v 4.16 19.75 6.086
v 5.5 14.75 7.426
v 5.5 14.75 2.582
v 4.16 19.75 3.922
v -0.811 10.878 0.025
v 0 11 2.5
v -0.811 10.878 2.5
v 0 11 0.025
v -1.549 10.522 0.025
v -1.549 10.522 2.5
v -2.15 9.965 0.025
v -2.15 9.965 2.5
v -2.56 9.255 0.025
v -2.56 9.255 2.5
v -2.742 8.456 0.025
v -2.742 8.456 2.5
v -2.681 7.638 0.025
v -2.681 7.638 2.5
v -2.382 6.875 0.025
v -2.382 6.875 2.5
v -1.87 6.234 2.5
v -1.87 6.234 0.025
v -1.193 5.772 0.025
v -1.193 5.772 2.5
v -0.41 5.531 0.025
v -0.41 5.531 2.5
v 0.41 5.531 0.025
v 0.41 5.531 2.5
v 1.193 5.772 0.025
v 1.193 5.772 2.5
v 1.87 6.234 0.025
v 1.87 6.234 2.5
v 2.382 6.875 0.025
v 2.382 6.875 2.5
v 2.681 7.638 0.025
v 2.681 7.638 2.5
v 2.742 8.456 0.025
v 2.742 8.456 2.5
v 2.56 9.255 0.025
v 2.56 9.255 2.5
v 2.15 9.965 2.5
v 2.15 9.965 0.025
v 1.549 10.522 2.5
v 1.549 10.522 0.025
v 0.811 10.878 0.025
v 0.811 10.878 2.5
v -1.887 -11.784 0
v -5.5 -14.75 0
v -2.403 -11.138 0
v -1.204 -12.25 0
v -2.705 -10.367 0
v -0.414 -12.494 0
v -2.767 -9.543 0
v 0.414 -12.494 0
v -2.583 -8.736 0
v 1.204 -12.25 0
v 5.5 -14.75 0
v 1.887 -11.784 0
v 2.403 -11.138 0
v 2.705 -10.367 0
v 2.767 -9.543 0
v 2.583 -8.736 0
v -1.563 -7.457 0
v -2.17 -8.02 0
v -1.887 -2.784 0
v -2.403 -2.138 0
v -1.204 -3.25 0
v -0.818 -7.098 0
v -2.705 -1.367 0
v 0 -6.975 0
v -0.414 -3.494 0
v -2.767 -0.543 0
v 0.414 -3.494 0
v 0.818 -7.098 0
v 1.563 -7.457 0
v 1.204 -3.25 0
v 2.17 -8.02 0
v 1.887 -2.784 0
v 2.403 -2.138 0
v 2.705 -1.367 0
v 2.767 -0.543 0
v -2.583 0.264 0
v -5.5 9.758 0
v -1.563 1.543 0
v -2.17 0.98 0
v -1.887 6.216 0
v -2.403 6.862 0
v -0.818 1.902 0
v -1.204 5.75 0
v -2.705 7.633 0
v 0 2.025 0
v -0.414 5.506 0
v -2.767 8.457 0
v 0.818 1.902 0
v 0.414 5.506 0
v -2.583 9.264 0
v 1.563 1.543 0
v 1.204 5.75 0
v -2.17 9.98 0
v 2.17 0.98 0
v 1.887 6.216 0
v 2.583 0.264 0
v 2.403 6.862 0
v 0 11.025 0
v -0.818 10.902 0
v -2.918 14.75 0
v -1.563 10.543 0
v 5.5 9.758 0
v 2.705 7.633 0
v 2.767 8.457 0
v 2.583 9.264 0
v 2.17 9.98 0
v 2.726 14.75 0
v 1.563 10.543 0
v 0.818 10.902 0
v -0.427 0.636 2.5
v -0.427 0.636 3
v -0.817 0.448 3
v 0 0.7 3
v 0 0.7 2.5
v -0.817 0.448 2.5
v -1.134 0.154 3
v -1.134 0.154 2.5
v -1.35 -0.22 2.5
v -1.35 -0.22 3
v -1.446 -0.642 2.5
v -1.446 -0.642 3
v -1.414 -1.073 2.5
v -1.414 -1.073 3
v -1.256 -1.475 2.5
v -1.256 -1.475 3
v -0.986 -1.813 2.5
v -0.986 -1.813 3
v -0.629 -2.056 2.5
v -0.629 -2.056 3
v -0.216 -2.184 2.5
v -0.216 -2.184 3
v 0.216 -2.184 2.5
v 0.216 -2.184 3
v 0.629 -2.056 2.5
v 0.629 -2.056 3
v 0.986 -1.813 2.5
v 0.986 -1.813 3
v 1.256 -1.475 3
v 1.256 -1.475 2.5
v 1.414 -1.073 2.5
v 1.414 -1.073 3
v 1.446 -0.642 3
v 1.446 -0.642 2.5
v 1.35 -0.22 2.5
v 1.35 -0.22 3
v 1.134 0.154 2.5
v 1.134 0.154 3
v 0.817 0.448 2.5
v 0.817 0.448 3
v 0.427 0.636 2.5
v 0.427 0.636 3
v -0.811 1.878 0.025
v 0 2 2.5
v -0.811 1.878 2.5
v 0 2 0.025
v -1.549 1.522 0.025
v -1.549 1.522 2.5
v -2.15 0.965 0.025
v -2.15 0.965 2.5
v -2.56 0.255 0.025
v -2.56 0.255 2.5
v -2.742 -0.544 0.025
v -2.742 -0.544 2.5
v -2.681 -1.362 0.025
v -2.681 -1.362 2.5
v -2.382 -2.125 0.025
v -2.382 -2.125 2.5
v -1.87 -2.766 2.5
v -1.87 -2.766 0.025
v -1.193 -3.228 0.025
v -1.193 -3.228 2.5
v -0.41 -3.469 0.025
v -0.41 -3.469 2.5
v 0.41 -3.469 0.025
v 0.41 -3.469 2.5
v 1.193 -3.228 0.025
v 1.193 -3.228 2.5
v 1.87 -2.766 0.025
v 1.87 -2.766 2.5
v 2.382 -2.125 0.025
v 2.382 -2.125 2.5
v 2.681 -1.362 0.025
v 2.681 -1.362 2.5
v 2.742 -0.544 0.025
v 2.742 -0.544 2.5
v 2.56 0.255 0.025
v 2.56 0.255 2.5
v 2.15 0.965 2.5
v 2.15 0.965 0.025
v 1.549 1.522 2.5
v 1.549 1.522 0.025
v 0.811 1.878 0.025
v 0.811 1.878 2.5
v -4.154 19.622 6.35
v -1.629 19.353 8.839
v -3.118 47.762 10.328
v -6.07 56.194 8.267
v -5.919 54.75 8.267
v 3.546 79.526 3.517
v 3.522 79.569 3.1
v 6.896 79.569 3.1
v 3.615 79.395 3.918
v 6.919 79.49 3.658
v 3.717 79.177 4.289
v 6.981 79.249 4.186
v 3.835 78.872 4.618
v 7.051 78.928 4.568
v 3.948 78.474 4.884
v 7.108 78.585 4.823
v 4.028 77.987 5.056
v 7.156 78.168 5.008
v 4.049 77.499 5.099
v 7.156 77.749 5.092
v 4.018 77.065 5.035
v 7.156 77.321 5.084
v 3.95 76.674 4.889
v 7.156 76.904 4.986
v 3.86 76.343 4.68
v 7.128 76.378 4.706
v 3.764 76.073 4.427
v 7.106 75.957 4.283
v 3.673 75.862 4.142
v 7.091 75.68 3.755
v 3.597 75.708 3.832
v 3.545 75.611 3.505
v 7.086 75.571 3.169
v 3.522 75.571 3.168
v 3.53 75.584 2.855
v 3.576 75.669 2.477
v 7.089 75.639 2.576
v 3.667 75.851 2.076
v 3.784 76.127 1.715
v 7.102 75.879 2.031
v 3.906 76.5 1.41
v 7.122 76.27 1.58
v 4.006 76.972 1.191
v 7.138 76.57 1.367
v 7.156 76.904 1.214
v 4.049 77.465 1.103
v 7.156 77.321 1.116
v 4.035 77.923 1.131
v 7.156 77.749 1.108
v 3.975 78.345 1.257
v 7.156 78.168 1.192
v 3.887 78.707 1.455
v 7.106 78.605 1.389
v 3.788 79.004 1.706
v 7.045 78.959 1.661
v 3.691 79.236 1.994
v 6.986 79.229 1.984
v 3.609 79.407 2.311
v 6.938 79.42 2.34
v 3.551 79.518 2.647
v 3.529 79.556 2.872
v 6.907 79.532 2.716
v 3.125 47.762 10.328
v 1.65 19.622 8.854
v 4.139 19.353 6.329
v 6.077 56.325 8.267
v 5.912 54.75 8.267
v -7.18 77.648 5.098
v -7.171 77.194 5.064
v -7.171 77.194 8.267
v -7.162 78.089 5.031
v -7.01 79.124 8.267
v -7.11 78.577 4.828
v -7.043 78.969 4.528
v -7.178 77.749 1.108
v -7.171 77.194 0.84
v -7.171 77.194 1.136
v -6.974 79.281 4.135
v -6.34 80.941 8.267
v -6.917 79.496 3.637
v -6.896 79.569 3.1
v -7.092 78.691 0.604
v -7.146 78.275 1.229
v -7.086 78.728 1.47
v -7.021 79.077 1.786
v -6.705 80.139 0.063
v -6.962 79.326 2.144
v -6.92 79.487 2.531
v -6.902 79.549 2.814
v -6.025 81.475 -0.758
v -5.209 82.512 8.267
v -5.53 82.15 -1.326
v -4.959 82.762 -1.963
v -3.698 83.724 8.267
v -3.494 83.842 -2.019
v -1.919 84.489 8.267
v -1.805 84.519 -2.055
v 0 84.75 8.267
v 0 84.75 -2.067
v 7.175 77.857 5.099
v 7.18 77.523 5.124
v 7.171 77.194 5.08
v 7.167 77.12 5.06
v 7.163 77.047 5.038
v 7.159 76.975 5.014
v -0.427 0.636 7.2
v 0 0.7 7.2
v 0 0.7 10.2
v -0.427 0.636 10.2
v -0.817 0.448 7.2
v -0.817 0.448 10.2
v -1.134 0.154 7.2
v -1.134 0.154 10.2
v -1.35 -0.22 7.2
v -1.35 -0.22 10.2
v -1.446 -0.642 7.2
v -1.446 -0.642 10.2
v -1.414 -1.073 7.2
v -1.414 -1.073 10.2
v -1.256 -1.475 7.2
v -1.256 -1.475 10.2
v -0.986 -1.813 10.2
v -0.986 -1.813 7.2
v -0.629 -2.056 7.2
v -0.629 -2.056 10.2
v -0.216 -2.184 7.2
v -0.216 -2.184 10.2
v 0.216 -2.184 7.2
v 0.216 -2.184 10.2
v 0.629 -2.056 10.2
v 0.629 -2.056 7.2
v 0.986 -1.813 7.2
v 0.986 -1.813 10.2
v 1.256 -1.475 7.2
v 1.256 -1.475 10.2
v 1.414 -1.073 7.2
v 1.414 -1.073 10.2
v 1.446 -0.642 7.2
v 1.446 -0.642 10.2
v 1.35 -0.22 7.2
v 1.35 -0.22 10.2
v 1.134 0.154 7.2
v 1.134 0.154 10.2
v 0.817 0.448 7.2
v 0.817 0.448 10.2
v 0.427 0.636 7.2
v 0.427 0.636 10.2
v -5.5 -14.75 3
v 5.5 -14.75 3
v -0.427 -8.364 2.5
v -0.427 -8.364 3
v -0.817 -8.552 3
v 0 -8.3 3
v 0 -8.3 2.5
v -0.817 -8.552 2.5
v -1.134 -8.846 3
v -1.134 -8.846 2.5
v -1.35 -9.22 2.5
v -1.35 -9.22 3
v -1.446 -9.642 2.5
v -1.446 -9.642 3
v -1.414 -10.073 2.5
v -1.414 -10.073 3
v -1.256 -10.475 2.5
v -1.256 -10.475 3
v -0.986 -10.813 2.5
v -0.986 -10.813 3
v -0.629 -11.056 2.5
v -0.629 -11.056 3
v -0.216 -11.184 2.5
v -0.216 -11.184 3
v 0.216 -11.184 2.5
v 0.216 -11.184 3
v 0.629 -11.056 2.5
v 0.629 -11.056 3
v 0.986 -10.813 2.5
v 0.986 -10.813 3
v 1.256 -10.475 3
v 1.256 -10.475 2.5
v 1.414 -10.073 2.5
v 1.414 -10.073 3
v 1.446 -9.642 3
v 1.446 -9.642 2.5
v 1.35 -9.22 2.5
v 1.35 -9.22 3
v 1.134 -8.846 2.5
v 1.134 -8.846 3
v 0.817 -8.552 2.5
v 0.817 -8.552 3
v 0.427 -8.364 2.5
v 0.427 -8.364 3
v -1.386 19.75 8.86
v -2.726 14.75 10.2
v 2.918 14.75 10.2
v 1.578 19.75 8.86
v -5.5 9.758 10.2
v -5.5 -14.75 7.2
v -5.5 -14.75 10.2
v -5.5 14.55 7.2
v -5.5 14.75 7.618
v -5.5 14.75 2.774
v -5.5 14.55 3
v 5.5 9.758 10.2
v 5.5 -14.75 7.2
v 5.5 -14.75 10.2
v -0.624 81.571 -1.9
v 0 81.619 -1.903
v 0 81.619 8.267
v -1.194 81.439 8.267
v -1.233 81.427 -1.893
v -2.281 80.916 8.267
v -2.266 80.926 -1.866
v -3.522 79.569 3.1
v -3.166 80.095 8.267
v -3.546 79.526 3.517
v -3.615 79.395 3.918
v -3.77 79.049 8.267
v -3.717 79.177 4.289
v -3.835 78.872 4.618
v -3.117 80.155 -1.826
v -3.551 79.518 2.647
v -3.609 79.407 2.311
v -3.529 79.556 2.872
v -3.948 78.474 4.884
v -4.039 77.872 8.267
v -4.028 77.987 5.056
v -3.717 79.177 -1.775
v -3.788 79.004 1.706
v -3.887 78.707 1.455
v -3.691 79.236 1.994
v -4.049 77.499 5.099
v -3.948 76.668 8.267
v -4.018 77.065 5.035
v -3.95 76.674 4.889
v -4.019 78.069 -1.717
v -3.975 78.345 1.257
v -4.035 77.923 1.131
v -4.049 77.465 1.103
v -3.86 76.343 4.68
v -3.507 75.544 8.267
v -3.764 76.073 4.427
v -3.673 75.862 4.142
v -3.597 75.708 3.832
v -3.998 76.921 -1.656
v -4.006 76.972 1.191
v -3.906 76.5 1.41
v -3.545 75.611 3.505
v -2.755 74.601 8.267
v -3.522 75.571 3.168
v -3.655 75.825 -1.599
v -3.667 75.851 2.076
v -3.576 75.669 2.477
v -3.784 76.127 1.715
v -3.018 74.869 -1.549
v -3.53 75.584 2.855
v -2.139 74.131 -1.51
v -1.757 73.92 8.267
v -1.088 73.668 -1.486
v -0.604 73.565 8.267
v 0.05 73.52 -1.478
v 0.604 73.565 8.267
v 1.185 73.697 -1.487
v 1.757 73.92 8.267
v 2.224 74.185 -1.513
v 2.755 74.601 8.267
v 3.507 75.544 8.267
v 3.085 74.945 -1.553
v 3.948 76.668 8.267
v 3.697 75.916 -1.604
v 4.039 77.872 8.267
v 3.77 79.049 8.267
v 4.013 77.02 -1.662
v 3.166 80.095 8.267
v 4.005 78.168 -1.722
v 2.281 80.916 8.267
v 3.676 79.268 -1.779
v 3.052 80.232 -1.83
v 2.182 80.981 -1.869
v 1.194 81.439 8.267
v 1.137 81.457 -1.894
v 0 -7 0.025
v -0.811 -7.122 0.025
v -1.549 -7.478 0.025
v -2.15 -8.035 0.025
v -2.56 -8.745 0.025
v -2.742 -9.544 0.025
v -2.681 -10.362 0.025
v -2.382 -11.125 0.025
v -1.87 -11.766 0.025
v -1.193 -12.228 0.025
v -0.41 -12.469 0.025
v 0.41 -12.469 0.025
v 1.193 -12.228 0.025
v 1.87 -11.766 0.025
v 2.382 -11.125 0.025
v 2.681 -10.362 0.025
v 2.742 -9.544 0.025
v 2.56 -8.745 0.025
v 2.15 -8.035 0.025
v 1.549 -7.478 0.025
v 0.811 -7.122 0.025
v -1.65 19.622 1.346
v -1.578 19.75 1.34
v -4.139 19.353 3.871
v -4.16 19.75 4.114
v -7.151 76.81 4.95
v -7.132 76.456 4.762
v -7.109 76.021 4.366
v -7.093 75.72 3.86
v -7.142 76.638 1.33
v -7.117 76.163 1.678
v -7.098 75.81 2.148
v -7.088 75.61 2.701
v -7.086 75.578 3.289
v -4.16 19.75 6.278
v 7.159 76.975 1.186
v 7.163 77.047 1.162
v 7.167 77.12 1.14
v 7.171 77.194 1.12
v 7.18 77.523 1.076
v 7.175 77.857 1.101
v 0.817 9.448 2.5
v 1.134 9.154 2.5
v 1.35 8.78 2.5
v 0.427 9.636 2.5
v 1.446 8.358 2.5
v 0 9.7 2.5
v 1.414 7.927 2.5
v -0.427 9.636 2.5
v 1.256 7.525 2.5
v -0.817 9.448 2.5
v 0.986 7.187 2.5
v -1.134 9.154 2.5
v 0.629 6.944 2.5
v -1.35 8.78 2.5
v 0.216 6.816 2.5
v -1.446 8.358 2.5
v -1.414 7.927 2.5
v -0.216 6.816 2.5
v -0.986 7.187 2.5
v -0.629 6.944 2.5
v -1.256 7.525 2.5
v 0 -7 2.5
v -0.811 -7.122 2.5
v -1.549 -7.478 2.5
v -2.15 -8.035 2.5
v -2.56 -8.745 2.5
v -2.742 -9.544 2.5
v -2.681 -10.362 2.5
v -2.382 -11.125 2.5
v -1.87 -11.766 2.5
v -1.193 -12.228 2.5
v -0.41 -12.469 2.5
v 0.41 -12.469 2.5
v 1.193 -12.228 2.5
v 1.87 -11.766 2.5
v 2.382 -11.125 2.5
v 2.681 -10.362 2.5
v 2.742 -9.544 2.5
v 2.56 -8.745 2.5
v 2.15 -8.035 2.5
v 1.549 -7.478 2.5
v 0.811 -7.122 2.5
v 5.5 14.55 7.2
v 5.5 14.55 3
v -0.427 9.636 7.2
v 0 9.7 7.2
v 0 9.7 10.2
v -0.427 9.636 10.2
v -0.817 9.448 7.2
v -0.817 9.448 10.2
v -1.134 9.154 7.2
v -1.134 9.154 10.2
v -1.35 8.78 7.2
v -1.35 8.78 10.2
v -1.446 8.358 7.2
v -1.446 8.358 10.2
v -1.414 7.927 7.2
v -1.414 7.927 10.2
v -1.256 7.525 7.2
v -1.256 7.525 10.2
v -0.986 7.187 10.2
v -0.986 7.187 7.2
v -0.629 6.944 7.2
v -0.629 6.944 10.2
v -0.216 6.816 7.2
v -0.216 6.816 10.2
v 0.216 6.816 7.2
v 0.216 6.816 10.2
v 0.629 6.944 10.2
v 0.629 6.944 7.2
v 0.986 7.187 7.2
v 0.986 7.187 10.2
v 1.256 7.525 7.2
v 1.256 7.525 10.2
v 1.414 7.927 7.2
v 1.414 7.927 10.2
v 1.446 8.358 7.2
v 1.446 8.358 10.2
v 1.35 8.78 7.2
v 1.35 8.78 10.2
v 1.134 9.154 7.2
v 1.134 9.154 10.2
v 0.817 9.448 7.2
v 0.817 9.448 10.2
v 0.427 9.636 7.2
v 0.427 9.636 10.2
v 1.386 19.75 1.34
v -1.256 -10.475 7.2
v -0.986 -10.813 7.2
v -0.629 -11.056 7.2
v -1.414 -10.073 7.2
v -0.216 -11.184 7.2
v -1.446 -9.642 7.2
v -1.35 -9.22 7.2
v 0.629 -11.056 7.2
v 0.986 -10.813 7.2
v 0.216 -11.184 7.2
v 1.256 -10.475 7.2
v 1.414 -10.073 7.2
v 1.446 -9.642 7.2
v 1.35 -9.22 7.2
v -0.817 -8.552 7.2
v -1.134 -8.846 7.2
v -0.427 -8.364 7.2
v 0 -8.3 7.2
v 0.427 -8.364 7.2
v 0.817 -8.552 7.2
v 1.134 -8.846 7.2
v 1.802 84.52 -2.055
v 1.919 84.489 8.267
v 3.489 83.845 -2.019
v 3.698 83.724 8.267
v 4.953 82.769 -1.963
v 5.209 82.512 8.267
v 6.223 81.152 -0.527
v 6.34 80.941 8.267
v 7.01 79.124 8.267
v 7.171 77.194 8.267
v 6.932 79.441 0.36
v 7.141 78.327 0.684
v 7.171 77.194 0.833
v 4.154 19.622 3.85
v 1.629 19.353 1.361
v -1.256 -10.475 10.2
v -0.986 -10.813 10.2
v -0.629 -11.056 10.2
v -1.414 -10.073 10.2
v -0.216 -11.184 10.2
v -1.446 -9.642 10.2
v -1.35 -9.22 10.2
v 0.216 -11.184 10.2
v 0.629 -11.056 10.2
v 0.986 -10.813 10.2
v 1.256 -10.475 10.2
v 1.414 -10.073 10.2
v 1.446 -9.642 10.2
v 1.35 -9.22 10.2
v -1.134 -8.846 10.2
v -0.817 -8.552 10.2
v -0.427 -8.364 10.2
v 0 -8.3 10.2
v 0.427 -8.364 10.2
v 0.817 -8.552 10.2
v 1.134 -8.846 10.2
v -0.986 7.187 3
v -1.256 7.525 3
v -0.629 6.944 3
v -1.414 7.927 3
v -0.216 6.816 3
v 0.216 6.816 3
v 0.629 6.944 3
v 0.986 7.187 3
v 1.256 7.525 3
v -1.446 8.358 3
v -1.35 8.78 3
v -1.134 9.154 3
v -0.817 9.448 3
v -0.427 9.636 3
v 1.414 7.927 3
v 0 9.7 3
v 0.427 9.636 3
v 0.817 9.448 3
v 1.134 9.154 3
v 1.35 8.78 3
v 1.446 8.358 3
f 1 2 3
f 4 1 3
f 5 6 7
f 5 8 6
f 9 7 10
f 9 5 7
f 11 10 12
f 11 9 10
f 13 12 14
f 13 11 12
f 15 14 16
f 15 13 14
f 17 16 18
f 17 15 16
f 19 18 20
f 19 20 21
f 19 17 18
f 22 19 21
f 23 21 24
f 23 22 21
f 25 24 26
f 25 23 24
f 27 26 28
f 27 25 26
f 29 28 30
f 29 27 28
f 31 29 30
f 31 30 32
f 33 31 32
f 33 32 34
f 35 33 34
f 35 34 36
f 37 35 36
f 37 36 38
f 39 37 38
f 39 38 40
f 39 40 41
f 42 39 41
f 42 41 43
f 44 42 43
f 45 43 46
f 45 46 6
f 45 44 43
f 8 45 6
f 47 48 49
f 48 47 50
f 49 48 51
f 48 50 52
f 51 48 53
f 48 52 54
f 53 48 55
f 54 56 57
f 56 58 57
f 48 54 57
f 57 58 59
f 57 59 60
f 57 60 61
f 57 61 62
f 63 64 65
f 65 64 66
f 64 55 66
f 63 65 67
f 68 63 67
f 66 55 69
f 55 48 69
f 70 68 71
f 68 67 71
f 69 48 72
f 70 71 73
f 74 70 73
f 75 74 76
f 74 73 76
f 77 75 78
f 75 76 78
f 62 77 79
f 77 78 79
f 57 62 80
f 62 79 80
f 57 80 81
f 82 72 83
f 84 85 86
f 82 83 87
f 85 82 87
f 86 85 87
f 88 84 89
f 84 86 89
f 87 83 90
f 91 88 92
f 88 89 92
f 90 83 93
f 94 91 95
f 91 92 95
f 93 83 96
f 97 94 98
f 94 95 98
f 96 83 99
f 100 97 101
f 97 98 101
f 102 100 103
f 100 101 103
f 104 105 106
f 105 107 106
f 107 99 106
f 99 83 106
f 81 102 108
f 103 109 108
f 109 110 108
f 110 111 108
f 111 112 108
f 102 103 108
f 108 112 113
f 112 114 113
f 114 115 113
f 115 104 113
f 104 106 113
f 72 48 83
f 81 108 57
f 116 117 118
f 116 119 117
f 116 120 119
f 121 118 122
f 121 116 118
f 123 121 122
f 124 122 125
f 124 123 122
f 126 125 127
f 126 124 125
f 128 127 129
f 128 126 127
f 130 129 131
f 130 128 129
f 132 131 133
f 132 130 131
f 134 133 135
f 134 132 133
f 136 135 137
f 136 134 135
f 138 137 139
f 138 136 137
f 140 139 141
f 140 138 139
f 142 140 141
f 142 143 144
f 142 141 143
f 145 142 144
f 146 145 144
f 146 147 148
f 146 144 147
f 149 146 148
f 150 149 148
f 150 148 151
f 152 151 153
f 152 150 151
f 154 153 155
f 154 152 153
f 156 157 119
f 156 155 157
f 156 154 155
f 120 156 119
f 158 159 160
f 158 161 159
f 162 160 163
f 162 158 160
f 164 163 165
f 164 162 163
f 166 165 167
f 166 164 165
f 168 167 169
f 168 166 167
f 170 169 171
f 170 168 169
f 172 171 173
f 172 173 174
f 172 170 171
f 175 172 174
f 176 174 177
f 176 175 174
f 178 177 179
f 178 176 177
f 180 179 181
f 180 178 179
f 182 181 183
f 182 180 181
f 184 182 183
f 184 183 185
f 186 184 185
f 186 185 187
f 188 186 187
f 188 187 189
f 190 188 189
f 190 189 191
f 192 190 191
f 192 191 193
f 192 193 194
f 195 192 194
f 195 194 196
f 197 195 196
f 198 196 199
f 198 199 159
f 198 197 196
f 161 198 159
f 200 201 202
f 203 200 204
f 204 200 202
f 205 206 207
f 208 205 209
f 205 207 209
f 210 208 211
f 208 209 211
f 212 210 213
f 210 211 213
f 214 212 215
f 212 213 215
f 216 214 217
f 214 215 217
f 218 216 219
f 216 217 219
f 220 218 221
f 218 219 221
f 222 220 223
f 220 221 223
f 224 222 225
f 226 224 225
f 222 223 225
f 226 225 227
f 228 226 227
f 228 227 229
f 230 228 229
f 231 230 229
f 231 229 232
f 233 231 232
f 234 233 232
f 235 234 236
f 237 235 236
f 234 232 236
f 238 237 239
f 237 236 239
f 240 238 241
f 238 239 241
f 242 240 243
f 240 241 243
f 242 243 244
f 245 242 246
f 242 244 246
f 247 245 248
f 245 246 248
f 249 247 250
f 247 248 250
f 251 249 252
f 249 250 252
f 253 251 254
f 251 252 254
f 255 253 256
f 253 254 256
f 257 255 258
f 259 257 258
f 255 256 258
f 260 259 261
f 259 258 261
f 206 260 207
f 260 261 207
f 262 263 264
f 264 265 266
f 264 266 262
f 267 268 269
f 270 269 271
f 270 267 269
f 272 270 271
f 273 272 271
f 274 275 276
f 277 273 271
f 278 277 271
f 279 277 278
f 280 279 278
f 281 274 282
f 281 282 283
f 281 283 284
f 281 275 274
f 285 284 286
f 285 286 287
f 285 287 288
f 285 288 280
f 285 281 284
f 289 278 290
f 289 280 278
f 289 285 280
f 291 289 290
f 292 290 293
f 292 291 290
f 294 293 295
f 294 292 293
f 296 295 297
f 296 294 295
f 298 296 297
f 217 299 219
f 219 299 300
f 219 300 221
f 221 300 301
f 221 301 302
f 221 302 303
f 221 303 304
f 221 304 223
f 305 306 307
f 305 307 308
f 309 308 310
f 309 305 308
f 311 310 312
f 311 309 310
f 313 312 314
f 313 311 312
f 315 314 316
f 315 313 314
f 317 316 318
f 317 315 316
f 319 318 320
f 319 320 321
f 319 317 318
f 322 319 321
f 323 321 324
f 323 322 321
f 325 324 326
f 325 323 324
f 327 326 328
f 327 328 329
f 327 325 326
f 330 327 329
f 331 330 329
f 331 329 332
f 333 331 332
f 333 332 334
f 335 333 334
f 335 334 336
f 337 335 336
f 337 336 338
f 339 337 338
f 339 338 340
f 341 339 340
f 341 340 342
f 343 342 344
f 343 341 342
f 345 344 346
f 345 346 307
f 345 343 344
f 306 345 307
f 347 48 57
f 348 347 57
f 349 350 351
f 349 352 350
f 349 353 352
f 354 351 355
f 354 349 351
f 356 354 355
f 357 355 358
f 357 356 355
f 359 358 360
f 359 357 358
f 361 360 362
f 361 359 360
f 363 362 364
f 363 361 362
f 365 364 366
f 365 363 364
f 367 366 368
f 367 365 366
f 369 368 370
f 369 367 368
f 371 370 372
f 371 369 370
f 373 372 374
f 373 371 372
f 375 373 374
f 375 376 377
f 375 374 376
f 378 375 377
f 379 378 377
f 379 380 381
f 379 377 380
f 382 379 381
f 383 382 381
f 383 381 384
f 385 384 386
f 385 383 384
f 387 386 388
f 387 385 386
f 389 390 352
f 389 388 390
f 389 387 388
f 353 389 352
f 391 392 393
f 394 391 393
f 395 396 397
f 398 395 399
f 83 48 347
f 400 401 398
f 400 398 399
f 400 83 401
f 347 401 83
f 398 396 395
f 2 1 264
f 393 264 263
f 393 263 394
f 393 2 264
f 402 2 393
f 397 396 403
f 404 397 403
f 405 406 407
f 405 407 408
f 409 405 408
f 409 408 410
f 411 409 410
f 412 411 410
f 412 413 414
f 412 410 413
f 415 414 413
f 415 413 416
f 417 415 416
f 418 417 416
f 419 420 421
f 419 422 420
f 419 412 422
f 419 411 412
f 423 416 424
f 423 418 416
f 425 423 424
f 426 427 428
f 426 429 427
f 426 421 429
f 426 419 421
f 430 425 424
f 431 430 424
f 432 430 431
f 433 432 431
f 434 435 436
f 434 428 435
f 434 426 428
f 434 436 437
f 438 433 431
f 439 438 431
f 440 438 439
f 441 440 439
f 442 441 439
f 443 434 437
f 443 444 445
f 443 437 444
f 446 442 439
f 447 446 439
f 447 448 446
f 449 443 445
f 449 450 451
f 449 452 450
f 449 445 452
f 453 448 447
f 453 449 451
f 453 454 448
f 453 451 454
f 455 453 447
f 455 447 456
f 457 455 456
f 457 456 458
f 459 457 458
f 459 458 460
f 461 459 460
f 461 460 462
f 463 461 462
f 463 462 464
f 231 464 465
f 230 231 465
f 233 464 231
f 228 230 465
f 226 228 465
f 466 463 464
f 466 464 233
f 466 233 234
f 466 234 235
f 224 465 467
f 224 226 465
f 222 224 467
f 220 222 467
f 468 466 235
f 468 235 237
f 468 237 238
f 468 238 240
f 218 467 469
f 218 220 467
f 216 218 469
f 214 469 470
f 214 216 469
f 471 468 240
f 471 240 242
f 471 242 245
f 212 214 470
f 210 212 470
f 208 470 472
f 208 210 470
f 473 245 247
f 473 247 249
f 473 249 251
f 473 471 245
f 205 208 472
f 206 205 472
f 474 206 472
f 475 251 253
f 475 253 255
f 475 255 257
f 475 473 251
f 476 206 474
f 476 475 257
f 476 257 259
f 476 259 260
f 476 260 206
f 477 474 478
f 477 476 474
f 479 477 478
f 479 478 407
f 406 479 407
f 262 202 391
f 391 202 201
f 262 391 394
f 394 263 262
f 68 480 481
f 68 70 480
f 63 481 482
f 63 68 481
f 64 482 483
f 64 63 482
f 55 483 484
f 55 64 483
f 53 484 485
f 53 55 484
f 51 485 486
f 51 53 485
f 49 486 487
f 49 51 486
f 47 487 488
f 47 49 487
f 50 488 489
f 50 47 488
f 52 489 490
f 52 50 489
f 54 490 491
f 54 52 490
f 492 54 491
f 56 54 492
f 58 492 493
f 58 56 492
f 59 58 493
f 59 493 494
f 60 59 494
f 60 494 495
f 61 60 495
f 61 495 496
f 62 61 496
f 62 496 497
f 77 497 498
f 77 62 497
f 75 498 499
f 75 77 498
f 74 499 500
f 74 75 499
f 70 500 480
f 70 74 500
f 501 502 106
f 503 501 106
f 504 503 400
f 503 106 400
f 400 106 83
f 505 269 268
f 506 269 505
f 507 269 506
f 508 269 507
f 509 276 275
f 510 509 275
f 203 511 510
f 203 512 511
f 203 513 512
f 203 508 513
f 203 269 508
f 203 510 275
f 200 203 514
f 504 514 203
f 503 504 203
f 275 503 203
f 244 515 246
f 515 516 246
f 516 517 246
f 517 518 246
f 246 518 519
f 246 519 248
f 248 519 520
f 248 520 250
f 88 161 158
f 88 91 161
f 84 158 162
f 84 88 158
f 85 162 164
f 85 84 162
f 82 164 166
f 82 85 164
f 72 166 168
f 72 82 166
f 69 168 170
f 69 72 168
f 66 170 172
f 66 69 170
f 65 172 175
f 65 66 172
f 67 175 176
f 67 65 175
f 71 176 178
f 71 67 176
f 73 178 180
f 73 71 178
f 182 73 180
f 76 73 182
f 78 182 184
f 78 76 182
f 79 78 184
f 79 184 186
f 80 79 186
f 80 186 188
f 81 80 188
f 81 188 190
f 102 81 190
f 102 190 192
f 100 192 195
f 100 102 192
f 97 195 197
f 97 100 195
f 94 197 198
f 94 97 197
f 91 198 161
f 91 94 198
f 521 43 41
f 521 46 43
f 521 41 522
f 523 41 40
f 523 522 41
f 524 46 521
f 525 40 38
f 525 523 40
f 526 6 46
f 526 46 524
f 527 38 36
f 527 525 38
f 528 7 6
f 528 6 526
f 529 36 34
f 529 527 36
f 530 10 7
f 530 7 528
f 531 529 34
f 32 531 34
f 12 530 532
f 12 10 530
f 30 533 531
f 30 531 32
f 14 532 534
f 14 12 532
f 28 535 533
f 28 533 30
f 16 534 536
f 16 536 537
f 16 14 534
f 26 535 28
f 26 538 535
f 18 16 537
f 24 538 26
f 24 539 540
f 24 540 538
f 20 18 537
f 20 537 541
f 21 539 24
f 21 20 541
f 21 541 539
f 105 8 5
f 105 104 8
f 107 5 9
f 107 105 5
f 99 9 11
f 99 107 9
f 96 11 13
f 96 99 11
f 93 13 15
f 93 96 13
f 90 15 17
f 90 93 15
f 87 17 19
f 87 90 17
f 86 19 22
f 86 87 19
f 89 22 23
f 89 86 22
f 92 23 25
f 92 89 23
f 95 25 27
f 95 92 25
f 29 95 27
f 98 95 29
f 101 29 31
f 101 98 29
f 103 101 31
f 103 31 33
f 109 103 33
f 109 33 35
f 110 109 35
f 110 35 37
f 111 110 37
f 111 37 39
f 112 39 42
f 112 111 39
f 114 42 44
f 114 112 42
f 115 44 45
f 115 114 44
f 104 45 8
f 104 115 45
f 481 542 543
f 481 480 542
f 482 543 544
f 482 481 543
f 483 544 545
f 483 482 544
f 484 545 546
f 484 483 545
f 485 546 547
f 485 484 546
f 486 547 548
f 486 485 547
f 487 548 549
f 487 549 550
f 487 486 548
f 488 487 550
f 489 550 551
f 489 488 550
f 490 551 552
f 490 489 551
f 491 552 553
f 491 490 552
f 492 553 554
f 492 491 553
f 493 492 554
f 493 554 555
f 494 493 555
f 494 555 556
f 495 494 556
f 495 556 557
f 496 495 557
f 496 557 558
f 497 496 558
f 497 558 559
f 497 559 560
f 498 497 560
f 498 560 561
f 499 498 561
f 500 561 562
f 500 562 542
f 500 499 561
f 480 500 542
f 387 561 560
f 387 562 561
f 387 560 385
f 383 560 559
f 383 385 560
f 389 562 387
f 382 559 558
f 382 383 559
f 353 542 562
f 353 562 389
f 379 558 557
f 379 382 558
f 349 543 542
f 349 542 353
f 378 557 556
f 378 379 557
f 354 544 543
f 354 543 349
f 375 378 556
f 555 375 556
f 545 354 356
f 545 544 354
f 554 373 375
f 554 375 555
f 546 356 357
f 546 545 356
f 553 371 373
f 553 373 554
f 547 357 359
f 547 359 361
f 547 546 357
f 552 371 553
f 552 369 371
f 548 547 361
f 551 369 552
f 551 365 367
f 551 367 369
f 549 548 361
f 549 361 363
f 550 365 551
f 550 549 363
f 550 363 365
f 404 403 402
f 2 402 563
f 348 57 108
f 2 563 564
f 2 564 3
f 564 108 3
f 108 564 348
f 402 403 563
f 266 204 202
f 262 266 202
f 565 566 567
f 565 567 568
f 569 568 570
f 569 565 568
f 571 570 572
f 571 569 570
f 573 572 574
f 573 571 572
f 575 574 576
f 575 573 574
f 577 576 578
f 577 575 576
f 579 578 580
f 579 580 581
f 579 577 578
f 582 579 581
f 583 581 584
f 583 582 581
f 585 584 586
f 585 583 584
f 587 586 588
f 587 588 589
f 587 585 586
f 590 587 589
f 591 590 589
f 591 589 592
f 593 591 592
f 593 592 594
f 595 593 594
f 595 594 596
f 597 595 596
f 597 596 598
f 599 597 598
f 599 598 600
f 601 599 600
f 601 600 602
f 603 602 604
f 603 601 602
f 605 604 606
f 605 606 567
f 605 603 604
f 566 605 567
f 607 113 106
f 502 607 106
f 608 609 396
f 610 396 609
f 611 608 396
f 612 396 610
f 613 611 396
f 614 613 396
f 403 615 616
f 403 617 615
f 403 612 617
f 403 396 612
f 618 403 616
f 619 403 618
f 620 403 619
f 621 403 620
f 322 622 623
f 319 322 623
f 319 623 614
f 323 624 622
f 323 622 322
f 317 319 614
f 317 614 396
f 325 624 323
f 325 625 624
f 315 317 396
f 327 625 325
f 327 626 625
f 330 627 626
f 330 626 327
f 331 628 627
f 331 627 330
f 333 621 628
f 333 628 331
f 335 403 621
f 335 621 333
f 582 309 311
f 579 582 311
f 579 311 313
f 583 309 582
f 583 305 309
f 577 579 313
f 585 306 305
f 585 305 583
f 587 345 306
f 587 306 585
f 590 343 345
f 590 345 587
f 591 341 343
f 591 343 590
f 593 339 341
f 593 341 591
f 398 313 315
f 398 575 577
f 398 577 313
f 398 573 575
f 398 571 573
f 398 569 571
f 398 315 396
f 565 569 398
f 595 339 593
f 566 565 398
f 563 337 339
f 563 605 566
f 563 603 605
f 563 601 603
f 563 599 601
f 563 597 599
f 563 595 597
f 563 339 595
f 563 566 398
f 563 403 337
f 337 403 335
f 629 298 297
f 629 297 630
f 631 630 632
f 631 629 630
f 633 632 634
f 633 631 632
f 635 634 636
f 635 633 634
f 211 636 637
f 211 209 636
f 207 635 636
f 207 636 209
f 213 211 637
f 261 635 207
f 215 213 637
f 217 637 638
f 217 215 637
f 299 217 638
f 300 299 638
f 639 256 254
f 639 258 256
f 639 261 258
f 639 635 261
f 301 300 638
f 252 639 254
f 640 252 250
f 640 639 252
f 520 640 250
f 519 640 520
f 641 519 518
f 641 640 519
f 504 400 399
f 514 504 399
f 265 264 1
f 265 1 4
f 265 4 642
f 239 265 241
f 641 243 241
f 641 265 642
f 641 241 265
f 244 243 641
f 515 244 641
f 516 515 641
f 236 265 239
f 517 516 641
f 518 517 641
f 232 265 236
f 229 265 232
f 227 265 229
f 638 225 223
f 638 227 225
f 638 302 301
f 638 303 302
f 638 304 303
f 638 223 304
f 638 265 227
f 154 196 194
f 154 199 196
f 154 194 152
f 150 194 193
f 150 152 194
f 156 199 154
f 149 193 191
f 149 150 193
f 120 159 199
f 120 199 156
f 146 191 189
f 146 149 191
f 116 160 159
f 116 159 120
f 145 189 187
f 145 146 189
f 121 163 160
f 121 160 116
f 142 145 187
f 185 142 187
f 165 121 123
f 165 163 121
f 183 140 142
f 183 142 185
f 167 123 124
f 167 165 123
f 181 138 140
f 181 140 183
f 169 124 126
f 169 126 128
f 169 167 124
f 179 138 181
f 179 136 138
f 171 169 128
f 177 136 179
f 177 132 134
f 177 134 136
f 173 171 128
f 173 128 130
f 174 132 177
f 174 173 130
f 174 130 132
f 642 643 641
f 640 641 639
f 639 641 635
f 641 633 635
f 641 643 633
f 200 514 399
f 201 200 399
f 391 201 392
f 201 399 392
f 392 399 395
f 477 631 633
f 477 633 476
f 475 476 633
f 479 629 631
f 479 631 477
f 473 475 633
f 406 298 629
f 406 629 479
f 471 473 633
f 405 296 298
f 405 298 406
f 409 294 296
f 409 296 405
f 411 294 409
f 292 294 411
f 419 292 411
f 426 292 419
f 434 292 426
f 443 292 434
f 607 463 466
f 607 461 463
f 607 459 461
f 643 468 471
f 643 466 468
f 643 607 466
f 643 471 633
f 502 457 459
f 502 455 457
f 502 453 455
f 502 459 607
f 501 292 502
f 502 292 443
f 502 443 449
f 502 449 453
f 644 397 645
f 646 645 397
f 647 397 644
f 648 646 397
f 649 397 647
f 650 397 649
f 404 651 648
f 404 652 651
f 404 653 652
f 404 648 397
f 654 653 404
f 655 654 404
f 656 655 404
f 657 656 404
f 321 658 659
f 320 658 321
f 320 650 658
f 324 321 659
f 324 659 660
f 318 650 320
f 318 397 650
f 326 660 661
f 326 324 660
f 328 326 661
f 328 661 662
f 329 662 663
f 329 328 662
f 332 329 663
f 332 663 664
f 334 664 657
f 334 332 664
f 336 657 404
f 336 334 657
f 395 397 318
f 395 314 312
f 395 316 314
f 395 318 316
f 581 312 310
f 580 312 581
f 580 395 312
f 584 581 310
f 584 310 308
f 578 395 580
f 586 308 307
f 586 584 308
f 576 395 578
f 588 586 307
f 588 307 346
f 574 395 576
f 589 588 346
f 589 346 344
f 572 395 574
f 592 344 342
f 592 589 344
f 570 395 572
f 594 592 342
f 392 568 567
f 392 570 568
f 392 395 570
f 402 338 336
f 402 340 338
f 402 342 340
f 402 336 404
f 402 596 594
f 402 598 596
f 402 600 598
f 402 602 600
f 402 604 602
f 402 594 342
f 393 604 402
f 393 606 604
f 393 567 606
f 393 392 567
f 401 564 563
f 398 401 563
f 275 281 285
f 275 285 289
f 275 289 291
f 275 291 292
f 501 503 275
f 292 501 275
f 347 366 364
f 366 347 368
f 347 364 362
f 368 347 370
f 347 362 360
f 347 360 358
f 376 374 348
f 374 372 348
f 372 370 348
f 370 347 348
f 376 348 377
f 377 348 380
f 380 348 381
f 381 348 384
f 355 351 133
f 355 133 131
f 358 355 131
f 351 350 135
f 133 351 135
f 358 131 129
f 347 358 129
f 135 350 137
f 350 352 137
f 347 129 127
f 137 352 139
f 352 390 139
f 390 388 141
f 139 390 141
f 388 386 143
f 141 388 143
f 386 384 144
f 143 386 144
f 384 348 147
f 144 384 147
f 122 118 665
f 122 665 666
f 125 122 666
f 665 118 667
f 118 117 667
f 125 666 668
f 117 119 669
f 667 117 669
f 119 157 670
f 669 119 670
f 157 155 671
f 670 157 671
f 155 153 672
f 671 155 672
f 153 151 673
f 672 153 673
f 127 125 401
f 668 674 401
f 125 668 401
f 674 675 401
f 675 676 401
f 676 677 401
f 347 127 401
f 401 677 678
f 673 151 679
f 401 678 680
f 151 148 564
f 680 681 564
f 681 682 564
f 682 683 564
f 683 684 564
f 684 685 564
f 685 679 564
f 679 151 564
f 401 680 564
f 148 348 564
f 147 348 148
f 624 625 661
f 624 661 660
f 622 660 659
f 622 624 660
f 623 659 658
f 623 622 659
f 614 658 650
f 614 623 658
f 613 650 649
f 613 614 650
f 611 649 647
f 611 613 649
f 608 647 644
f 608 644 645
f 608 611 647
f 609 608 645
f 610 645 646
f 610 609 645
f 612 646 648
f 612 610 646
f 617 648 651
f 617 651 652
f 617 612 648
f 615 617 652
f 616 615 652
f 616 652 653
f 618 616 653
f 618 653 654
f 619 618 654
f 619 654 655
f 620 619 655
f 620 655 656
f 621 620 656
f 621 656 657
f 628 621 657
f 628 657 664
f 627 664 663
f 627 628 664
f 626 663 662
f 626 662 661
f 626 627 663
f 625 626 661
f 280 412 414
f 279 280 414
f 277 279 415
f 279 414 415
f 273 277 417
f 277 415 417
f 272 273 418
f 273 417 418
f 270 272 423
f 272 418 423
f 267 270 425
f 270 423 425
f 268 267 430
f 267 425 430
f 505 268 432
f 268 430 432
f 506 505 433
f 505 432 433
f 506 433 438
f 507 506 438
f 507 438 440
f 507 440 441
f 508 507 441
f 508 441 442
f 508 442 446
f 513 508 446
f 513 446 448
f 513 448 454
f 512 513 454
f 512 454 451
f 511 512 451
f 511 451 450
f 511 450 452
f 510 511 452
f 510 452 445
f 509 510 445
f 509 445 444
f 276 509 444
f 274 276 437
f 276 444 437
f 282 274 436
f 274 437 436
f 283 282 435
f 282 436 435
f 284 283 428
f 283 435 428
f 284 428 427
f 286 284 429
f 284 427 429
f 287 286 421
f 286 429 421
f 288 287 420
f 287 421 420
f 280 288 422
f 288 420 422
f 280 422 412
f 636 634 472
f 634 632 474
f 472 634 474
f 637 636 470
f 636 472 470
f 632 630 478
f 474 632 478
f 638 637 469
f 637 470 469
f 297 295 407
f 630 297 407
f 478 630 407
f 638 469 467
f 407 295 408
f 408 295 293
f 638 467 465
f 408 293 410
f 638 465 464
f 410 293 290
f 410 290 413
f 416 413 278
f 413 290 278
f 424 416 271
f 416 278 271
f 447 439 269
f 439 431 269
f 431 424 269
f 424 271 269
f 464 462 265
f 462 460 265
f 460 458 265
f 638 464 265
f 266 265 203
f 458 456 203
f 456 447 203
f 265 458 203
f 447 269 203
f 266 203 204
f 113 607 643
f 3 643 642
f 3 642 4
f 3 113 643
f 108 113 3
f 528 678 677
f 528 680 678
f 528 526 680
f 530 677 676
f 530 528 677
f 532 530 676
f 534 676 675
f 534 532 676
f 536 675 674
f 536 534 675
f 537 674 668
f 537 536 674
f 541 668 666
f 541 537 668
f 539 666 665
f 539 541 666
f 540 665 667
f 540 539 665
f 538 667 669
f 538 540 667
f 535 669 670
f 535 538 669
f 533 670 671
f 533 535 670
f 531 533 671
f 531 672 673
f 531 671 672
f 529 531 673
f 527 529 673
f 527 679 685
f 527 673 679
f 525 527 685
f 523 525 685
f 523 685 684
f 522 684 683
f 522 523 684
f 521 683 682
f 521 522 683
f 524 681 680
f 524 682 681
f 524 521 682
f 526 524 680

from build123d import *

# Parameters (mm, degrees)
SKETCH1_W                       = 11
SKETCH1_H                       = 29.5
BOSS_EXTRUDE1_DEPTH             = 10.2
CBORE_FOR_M2_5_SHCS1_AT_2_COUNT = 2
CBORE_FOR_M2_5_SHCS1_AT_2_PITCH = 9
CBORE_FOR_M2_5_SHCS1_AT_3_COUNT = 2
CBORE_FOR_M2_5_SHCS1_AT_3_PITCH = 18
CUT_EXTRUDE1_DEPTH              = 22.038120163
CUT_EXTRUDE1_DEPTH_BACK         = 22.038120163
SKETCH5_W                       = 4.2
SKETCH5_H                       = 29.3
SKETCH6_W                       = 11
SKETCH6_H                       = 10.2
BOSS_EXTRUDE2_DEPTH             = 5
BOSS_EXTRUDE2_TAPER             = 15
SKETCH7_W                       = 8.320508076
SKETCH7_H                       = 7.520508076
BOSS_EXTRUDE3_DEPTH             = 65
BOSS_EXTRUDE3_DRAFT             = -3
CHAMFER1_SIZE                   = 2.685958206
CHAMFER1_SIZE_2                 = 2.5
CHAMFER1_SIZE_3                 = 2.506875868
FILLET1_R                       = 7.180587
CUT_EXTRUDE2_DEPTH              = 87.566929667
CUT_EXTRUDE2_DEPTH_BACK         = 87.566929667
CUT_EXTRUDE4_DEPTH              = 86.67908162
CUT_EXTRUDE4_DEPTH_BACK         = 86.67908162
SKETCH13_R                      = 4.05
F_4_0MM_DOWEL_HOLE1_OUTLINE_W   = 2
F_4_0MM_DOWEL_HOLE1_OUTLINE_H   = 3.659209284


# Read off the part's stored shape, not the designer's step: Ø4.0mm Dowel Hole1
# Some blends are built 0.0001 mm under size
with BuildPart() as part:
    # Sketch1 → Boss-Extrude1 (new body)
    with BuildSketch(Plane.XY):
        Rectangle(SKETCH1_W, SKETCH1_H)
    extrude(amount=BOSS_EXTRUDE1_DEPTH)

    # Sketch4 → CBORE for M2.5 SHCS1 (revolve, cut)
    with BuildSketch(Plane(origin=(0, -9.75, 0), x_dir=(0, 1, 0), z_dir=(1, 0, 0))):
        Polygon((0, 0), (0, 10.2), (1.45, 10.2), (1.45, 2.5), (2.75, 2.5), (2.75, 0.025), (2.775, 0), align=None)
    cbore_for_m2_5_shcs1 = revolve(axis=Axis((0, -9.75, -6.35), (0, 0, 1)), mode=Mode.SUBTRACT)

    # CBORE for M2.5 SHCS1 at 2: CBORE for M2.5 SHCS1 ×2
    with Locations(*[(0, i * CBORE_FOR_M2_5_SHCS1_AT_2_PITCH, 0) for i in range(1, CBORE_FOR_M2_5_SHCS1_AT_2_COUNT)]):
        add(cbore_for_m2_5_shcs1, mode=Mode.SUBTRACT)

    # CBORE for M2.5 SHCS1 at 3: CBORE for M2.5 SHCS1 ×2
    with Locations(*[(0, i * CBORE_FOR_M2_5_SHCS1_AT_3_PITCH, 0) for i in range(1, CBORE_FOR_M2_5_SHCS1_AT_3_COUNT)]):
        add(cbore_for_m2_5_shcs1, mode=Mode.SUBTRACT)

    # Sketch5 → Cut-Extrude1 (cut, two sides: drawn at the far end of the back side and taken through both)
    with BuildSketch(Plane.ZY.offset(5.5).offset(-CUT_EXTRUDE1_DEPTH_BACK)):
        with Locations((5.1, -0.1)):
            Rectangle(SKETCH5_W, SKETCH5_H)
    extrude(amount=CUT_EXTRUDE1_DEPTH + CUT_EXTRUDE1_DEPTH_BACK, mode=Mode.SUBTRACT)

    # Sketch6 → Boss-Extrude2 (add)
    with BuildSketch(Plane(origin=(0, 14.75, 0), x_dir=(1, 0, 0), z_dir=(0, 1, 0))):
        with Locations((0, -5.1)):
            Rectangle(SKETCH6_W, SKETCH6_H)
    extrude(amount=BOSS_EXTRUDE2_DEPTH, taper=BOSS_EXTRUDE2_TAPER)


with BuildPart() as boss_extrude3_tool:
    # Sketch7 → Boss-Extrude3 (with draft: the straight prism first)
    with BuildSketch(Plane(origin=(0, 19.75, 0), x_dir=(1, 0, 0), z_dir=(0, 1, 0))):
        with Locations((0, -5.1)):
            Rectangle(SKETCH7_W, SKETCH7_H)
    extrude(amount=BOSS_EXTRUDE3_DEPTH)
    # Boss-Extrude3: the draft: its side faces are tilted about the plane it starts from
    boss_extrude3_sides = [boss_extrude3_tool.faces().sort_by_distance(p)[0] for p in [
        (4.160254038, 52.25, 5.1),
        (0, 52.25, 1.339745962),
        (-4.160254038, 52.25, 5.1),
        (0, 52.25, 8.860254038),
    ]]
    draft(boss_extrude3_sides, Plane(origin=(0, 19.75, 0), x_dir=(1, 0, 0), z_dir=(0, 1, 0)), BOSS_EXTRUDE3_DRAFT)


with BuildPart() as part_1:
    add(part.part)

    # Boss-Extrude3: add boss_extrude3_tool
    add(boss_extrude3_tool.part)

    # Chamfer1
    # the kernel refuses this chamfer: 2.685958206, 2.506875868, 2.5 mm, written as the material it takes off along each edge
    with BuildSketch(Plane(origin=(7.233738269, 8.279600693, 11.933738269), x_dir=(0.08950679865400309, -0.23533376139402715, -0.967784352912802), z_dir=(-0.25056280708573236, 0.9351131265310291, -0.25056280708573203))) as chamfer1_piece_1_section:
        Polygon((CHAMFER1_SIZE * 0.999673594955, CHAMFER1_SIZE * 0.0255480690476), (-CHAMFER1_SIZE_2 * 0.0924561168006, CHAMFER1_SIZE_2 * 0.995716760161), (0, 0), align=None)
    chamfer1_piece_1 = extrude(amount=19.185698612, mode=Mode.PRIVATE)
    chamfer1_piece_1 = split(chamfer1_piece_1, bisect_by=Plane(origin=(4.749112244, 14.607483703, 8.590746179), z_dir=(0, -0.05233595624294391, 0.9986295347545739)), keep=Keep.TOP, mode=Mode.PRIVATE)
    add(chamfer1_piece_1, mode=Mode.SUBTRACT)
    with BuildSketch(Plane(origin=(7.233738269, 8.279600693, 11.933738269), x_dir=(0.08950679865400309, -0.23533376139402715, -0.967784352912802), z_dir=(-0.25056280708573236, 0.9351131265310291, -0.25056280708573203))) as chamfer1_piece_2_section:
        Polygon((CHAMFER1_SIZE * 0.999673594955, CHAMFER1_SIZE * 0.0255480690476), (-CHAMFER1_SIZE_2 * 0.0924561168006, CHAMFER1_SIZE_2 * 0.995716760161), (0, 0), align=None)
    chamfer1_piece_2 = extrude(amount=19.185698612, mode=Mode.PRIVATE)
    chamfer1_piece_2 = split(chamfer1_piece_2, bisect_by=Plane(origin=(4.006118706, 16.808922673, 7.98117222), z_dir=(0.9986295347545739, -0.05233595624294391, 0)), keep=Keep.TOP, mode=Mode.PRIVATE)
    add(chamfer1_piece_2, mode=Mode.SUBTRACT)
    with BuildSketch(Plane(origin=(7.233738269, 8.279600693, -1.733738269), x_dir=(-0.967784352912802, -0.23533376139402723, -0.08950679865400304), z_dir=(-0.25056280708573203, 0.9351131265310291, 0.25056280708573203))) as chamfer1_piece_3_section:
        Polygon((CHAMFER1_SIZE * 0.999673594955, CHAMFER1_SIZE * 0.0255480690476), (-CHAMFER1_SIZE_2 * 0.0924561168006, CHAMFER1_SIZE_2 * 0.995716760161), (0, 0), align=None)
    chamfer1_piece_3 = extrude(amount=19.185698612, mode=Mode.PRIVATE)
    chamfer1_piece_3 = split(chamfer1_piece_3, bisect_by=Plane(origin=(3.890746179, 14.607483703, 0.750887756), z_dir=(0.9986295347545739, -0.05233595624294391, 0)), keep=Keep.TOP, mode=Mode.PRIVATE)
    add(chamfer1_piece_3, mode=Mode.SUBTRACT)
    with BuildSketch(Plane(origin=(7.233738269, 8.279600693, -1.733738269), x_dir=(-0.967784352912802, -0.23533376139402723, -0.08950679865400304), z_dir=(-0.25056280708573203, 0.9351131265310291, 0.25056280708573203))) as chamfer1_piece_4_section:
        Polygon((CHAMFER1_SIZE * 0.999673594955, CHAMFER1_SIZE * 0.0255480690476), (-CHAMFER1_SIZE_2 * 0.0924561168006, CHAMFER1_SIZE_2 * 0.995716760161), (0, 0), align=None)
    chamfer1_piece_4 = extrude(amount=19.185698612, mode=Mode.PRIVATE)
    chamfer1_piece_4 = split(chamfer1_piece_4, bisect_by=Plane(origin=(3.28117222, 16.808922673, 1.493881294), z_dir=(0, -0.05233595624294391, -0.9986295347545739)), keep=Keep.TOP, mode=Mode.PRIVATE)
    add(chamfer1_piece_4, mode=Mode.SUBTRACT)
    with BuildSketch(Plane(origin=(-7.233738269, 8.279600693, -1.733738269), x_dir=(0.9676796057430587, -0.2342901423618477, -0.09329689073610087), z_dir=(0.25056280708573236, 0.9351131265310291, 0.25056280708573203))) as chamfer1_piece_5_section:
        Polygon((CHAMFER1_SIZE_2 * 0.999565396144, -CHAMFER1_SIZE_2 * 0.0294791253514), (-CHAMFER1_SIZE * 0.0963710953578, -CHAMFER1_SIZE * 0.995345473824), (0, 0), align=None)
    chamfer1_piece_5 = extrude(amount=19.185698612, mode=Mode.PRIVATE)
    chamfer1_piece_5 = split(chamfer1_piece_5, bisect_by=Plane(origin=(-3.890770711, 14.607951798, 0.759844086), z_dir=(-0.9986295347545739, -0.05233595624294391, 0)), keep=Keep.TOP, mode=Mode.PRIVATE)
    add(chamfer1_piece_5, mode=Mode.SUBTRACT)
    with BuildSketch(Plane(origin=(-7.233738269, 8.279600693, -1.733738269), x_dir=(0.9676796057430587, -0.2342901423618477, -0.09329689073610087), z_dir=(0.25056280708573236, 0.9351131265310291, 0.25056280708573203))) as chamfer1_piece_6_section:
        Polygon((CHAMFER1_SIZE_2 * 0.999565396144, -CHAMFER1_SIZE_2 * 0.0294791253514), (-CHAMFER1_SIZE * 0.0963710953578, -CHAMFER1_SIZE * 0.995345473824), (0, 0), align=None)
    chamfer1_piece_6 = extrude(amount=19.185698612, mode=Mode.PRIVATE)
    chamfer1_piece_6 = split(chamfer1_piece_6, bisect_by=Plane(origin=(-3.341994856, 16.885507899, 1.489867632), z_dir=(0, -0.05233595624294391, -0.9986295347545739)), keep=Keep.TOP, mode=Mode.PRIVATE)
    add(chamfer1_piece_6, mode=Mode.SUBTRACT)
    with BuildSketch(Plane(origin=(-7.233738269, 8.279600693, 11.933738269), x_dir=(-0.09329689073610087, -0.2342901423618474, -0.9676796057430587), z_dir=(0.25056280708573203, 0.9351131265310291, -0.25056280708573203))) as chamfer1_piece_7_section:
        Polygon((CHAMFER1_SIZE_2 * 0.999565396144, -CHAMFER1_SIZE_2 * 0.0294791253514), (-CHAMFER1_SIZE * 0.0963710953578, -CHAMFER1_SIZE * 0.995345473824), (0, 0), align=None)
    chamfer1_piece_7 = extrude(amount=19.185698612, mode=Mode.PRIVATE)
    chamfer1_piece_7 = split(chamfer1_piece_7, bisect_by=Plane(origin=(-4.740155914, 14.607951798, 8.590770711), z_dir=(0, -0.05233595624294391, 0.9986295347545739)), keep=Keep.TOP, mode=Mode.PRIVATE)
    add(chamfer1_piece_7, mode=Mode.SUBTRACT)
    with BuildSketch(Plane(origin=(-7.233738269, 8.279600693, 11.933738269), x_dir=(-0.09329689073610087, -0.2342901423618474, -0.9676796057430587), z_dir=(0.25056280708573203, 0.9351131265310291, -0.25056280708573203))) as chamfer1_piece_8_section:
        Polygon((CHAMFER1_SIZE_2 * 0.999565396144, -CHAMFER1_SIZE_2 * 0.0294791253514), (-CHAMFER1_SIZE * 0.0963710953578, -CHAMFER1_SIZE * 0.995345473824), (0, 0), align=None)
    chamfer1_piece_8 = extrude(amount=19.185698612, mode=Mode.PRIVATE)
    chamfer1_piece_8 = split(chamfer1_piece_8, bisect_by=Plane(origin=(-4.010132368, 16.885507899, 8.041994856), z_dir=(-0.9986295347545739, -0.05233595624294391, 0)), keep=Keep.TOP, mode=Mode.PRIVATE)
    add(chamfer1_piece_8, mode=Mode.SUBTRACT)
    # the kernel refuses this chamfer: 2.685958206, 2.506875868, 2.5 mm, written as the material it takes off along each edge
    with BuildSketch(Plane(origin=(-3.604484305, 9.145281757, 8.304484305), x_dir=(0.998257838122397, 0.05073820775547923, 0.03011516064974776), z_dir=(-0.052264427688714005, 0.9972646886342373, 0.05226442768871396))) as chamfer1_2_piece_1_section:
        Polygon((CHAMFER1_SIZE_3 * 0.999624043446, CHAMFER1_SIZE_3 * 0.0274184562475), (-CHAMFER1_SIZE_2 * 0.0301563759466, CHAMFER1_SIZE_2 * 0.99954519307), (0, 0), align=None)
    chamfer1_2_piece_1 = extrude(amount=82.259449266, mode=Mode.PRIVATE)
    chamfer1_2_piece_1 = split(chamfer1_2_piece_1, bisect_by=Plane(origin=(4.065038814, 46.715563442, -0.016857923), z_dir=(-0.6371565255737595, 0.35415028175354435, 0.6845503194452988)), keep=Keep.TOP, mode=Mode.PRIVATE)
    add(chamfer1_2_piece_1, mode=Mode.SUBTRACT)
    with BuildSketch(Plane(origin=(7.903727343, 91.179725817, 12.603727343), x_dir=(-0.9982536933382549, 0.05073009352715152, 0.0302658445654427), z_dir=(-0.05226442768871403, -0.9972646886342373, -0.05226442768871396))) as chamfer1_2_piece_2_section:
        Polygon((CHAMFER1_SIZE_2 * 0.999619893, CHAMFER1_SIZE_2 * 0.0275693583223), (-CHAMFER1_SIZE_3 * 0.0303072660864, CHAMFER1_SIZE_3 * 0.999540629289), (0, 0), align=None)
    chamfer1_2_piece_2 = extrude(amount=82.259449266, mode=Mode.PRIVATE)
    chamfer1_2_piece_2 = split(chamfer1_2_piece_2, bisect_by=Plane(origin=(-4.73972724, 46.729717564, 0.651664322), z_dir=(0.6845503194452992, 0.35415028175354457, 0.6371565255737587)), keep=Keep.TOP, mode=Mode.PRIVATE)
    add(chamfer1_2_piece_2, mode=Mode.SUBTRACT)
    with BuildSketch(Plane(origin=(7.903727343, 91.179725817, -2.403727343), x_dir=(-0.998257838122397, 0.05073820775547923, -0.030115160649747844), z_dir=(-0.052264427688714005, -0.9972646886342373, 0.052264427688714005))) as chamfer1_2_piece_3_section:
        Polygon((CHAMFER1_SIZE_3 * 0.999624043446, -CHAMFER1_SIZE_3 * 0.0274184562475), (-CHAMFER1_SIZE_2 * 0.0301563759466, -CHAMFER1_SIZE_2 * 0.99954519307), (0, 0), align=None)
    chamfer1_2_piece_3 = extrude(amount=82.259449266, mode=Mode.PRIVATE)
    chamfer1_2_piece_3 = split(chamfer1_2_piece_3, bisect_by=Plane(origin=(-4.265855273, 47.413955288, 10.391255842), z_dir=(0.6371565255737592, 0.35415028175354435, -0.6845503194452989)), keep=Keep.TOP, mode=Mode.PRIVATE)
    add(chamfer1_2_piece_3, mode=Mode.SUBTRACT)
    with BuildSketch(Plane(origin=(-3.604484305, 9.145281757, 1.895515695), x_dir=(-0.030115160649747664, 0.05073820775547925, 0.998257838122397), z_dir=(-0.05226442768871402, 0.9972646886342373, -0.052264427688714025))) as chamfer1_2_piece_4_section:
        Polygon((CHAMFER1_SIZE_3 * 0.999624043446, CHAMFER1_SIZE_3 * 0.0274184562475), (-CHAMFER1_SIZE_2 * 0.0301563759466, CHAMFER1_SIZE_2 * 0.99954519307), (0, 0), align=None)
    chamfer1_2_piece_4 = extrude(amount=82.259449266, mode=Mode.PRIVATE)
    chamfer1_2_piece_4 = split(chamfer1_2_piece_4, bisect_by=Plane(origin=(-2.919667619, 22.551503967, 4.338501317), z_dir=(-0.6845503194452986, 0.35415028175354457, -0.6371565255737593)), keep=Keep.TOP, mode=Mode.PRIVATE)
    add(chamfer1_2_piece_4, mode=Mode.SUBTRACT)

    # Fillet1
    fillet1_edges = [part_1.edges().sort_by_distance(p)[0] for p in [
        (-7.566759691, 84.75, 5.103442639),
        (7.566759691, 84.75, 5.096557361),
    ]]
    fillet(fillet1_edges, radius=FILLET1_R - 0.0001)  # a hair under: the kernel refuses the full size

    # Sketch8 → Cut-Extrude2 (cut, two sides: drawn at the far end of the back side and taken through both)
    with BuildSketch(Plane(origin=(5.5, 0, 0), x_dir=(0, 0, -1), z_dir=(1, 0, 0)).offset(-CUT_EXTRUDE2_DEPTH_BACK)):
        Polygon((-8.266759691, 84.75), (-8.266759691, 54.75), (-10.328323266, 47.762429615), (-12.162595541, 82.762429615), (-12.266759691, 84.75), align=None)
    extrude(amount=CUT_EXTRUDE2_DEPTH + CUT_EXTRUDE2_DEPTH_BACK, mode=Mode.SUBTRACT)

    # Sketch13 → Cut-Extrude4 (cut, two sides: drawn at the far end of the back side and taken through both)
    with BuildSketch(Plane.XY.offset(8.266759691).offset(-CUT_EXTRUDE4_DEPTH_BACK)):
        with Locations(Location((0, 77.569413168, 0), (0, 0, 90))):
            Circle(SKETCH13_R)
    extrude(amount=CUT_EXTRUDE4_DEPTH + CUT_EXTRUDE4_DEPTH_BACK, mode=Mode.SUBTRACT)

    # Ø4.0mm Dowel Hole1 outline → Ø4.0mm Dowel Hole1 (revolve, cut)
    with BuildSketch(Plane(origin=(0, 77.569413168, 3.1), x_dir=(0, 1, 0), z_dir=(0, 0, -1))):
        with Locations((1, -5.351071492)):
            Rectangle(F_4_0MM_DOWEL_HOLE1_OUTLINE_W, F_4_0MM_DOWEL_HOLE1_OUTLINE_H)
        Polygon((0, 3.52146685), (2, 3.52146685), (2, 7.155586832), (2, 7.180612509), (0, 7.180612509), align=None)
        Polygon((2, 7.180612509), (2, 7.155586674), (2.025011882, 7.180598714), align=None)
    revolve(axis=Axis((0, 77.569413168, 3.1), (1, 0, 0)), mode=Mode.SUBTRACT)


solid = part_1.part
